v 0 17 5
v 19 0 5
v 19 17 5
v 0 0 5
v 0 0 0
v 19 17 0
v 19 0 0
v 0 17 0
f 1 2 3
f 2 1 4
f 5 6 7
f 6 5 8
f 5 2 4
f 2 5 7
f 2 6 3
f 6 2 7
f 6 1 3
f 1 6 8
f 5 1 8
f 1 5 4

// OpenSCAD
// Generated by SolidPython 1.0.1 on 2020-07-29 00:46:56


cube(size = [19, 17, 5]);
/***********************************************
*********      SolidPython code:      **********
************************************************
 
# import packages: SolidPython
from solid import *
from solid.utils import *
from itertools import chain, combinations, permutations


class Resize:

    def __init__(self, scad_file):
        self.scad_file = scad_file
        #self.scad_file = import_scad(scad_file)
        # cone/cylinder param:
        self.r1 = 0
        self.r2 = 0
        self.h = 0
        # rectangular prism param:
        self.w = 0
        self.l = 0
        # ellipse param:
        self.r = 0

    # import OpenScad code (file name corresponds to shape)


    # classify shape + parameters
    def assign(self, param1, param2, param3):
        if self.scad_file == 'cone.scad':
            self.r1 = param1
            self.r2 = param2
            self.h = param3
        elif self.scad_file == 'cylinder.scad':
            self.r1 = param1
            self.r2 = param2
            self.h = param3
        elif self.scad_file == 'rectangularPrism.scad':
            self.h = param1
            self.l = param2
            self.w = param3
        else:
            self.r = param1
            self.h = param2

    # resize parameters
    def iterate(self):
        x = range(3, 20, 2)
        i = 1
        if self.scad_file == 'cone.scad':
            tempList = list(permutations(x, 2))
            for temp in tempList:
                param1 = temp[0]
                param2 = temp[1]
                filepath = 'produced_scad_files/' + 'cone' + str(param1) + '_' + str(param2) + '_' + '.scad'
                scad_render_to_file(cylinder(h=param1, r1=param2, r2=0), filepath)

        elif self.scad_file == 'cylinder.scad':
            tempList = list(permutations(x, 3))
            for temp in tempList:
                param1 = temp[0]
                param2 = temp[1]
                filepath = 'produced_scad_files/' + 'cylinder' + str(param1) + '_' + str(param2) + '_' + '.scad'
                scad_render_to_file(cylinder(h=param1, r1=param2, r2=param2), filepath)

        elif self.scad_file == 'rectangularPrism.scad':
            tempList = list(permutations(x, 3))
            for temp in tempList:
                param1 = temp[0]
                param2 = temp[1]
                param3 = temp[2]
                filepath = 'produced_scad_files/' + 'rectangularPrism' + str(param1) + '_' + str(param2) + '_' + str(
                    param3) + '.scad'
                scad_render_to_file(cube(size=(param1, param2, param3)), filepath)

        elif self.scad_file == 'ellipse.scad':
            tempList = list(permutations(x, 4))
            for temp in tempList:
                param1 = temp[0]
                param2 = temp[1]
                param3 = temp[2]
                param4 = temp[3]
                filepath = 'produced_scad_files/' + 'ellipse' + str(param1) + '_' + str(param2) + '_' + str(param3) + '_' + str(param4) + '.scad'
                scad_render_to_file(scale([param1, param2, param3])(sphere(r=param4)), filepath)

    def render_to_scadfile(self):
        scad_render_to_file(scad, 'example.scad') 
 
************************************************/
